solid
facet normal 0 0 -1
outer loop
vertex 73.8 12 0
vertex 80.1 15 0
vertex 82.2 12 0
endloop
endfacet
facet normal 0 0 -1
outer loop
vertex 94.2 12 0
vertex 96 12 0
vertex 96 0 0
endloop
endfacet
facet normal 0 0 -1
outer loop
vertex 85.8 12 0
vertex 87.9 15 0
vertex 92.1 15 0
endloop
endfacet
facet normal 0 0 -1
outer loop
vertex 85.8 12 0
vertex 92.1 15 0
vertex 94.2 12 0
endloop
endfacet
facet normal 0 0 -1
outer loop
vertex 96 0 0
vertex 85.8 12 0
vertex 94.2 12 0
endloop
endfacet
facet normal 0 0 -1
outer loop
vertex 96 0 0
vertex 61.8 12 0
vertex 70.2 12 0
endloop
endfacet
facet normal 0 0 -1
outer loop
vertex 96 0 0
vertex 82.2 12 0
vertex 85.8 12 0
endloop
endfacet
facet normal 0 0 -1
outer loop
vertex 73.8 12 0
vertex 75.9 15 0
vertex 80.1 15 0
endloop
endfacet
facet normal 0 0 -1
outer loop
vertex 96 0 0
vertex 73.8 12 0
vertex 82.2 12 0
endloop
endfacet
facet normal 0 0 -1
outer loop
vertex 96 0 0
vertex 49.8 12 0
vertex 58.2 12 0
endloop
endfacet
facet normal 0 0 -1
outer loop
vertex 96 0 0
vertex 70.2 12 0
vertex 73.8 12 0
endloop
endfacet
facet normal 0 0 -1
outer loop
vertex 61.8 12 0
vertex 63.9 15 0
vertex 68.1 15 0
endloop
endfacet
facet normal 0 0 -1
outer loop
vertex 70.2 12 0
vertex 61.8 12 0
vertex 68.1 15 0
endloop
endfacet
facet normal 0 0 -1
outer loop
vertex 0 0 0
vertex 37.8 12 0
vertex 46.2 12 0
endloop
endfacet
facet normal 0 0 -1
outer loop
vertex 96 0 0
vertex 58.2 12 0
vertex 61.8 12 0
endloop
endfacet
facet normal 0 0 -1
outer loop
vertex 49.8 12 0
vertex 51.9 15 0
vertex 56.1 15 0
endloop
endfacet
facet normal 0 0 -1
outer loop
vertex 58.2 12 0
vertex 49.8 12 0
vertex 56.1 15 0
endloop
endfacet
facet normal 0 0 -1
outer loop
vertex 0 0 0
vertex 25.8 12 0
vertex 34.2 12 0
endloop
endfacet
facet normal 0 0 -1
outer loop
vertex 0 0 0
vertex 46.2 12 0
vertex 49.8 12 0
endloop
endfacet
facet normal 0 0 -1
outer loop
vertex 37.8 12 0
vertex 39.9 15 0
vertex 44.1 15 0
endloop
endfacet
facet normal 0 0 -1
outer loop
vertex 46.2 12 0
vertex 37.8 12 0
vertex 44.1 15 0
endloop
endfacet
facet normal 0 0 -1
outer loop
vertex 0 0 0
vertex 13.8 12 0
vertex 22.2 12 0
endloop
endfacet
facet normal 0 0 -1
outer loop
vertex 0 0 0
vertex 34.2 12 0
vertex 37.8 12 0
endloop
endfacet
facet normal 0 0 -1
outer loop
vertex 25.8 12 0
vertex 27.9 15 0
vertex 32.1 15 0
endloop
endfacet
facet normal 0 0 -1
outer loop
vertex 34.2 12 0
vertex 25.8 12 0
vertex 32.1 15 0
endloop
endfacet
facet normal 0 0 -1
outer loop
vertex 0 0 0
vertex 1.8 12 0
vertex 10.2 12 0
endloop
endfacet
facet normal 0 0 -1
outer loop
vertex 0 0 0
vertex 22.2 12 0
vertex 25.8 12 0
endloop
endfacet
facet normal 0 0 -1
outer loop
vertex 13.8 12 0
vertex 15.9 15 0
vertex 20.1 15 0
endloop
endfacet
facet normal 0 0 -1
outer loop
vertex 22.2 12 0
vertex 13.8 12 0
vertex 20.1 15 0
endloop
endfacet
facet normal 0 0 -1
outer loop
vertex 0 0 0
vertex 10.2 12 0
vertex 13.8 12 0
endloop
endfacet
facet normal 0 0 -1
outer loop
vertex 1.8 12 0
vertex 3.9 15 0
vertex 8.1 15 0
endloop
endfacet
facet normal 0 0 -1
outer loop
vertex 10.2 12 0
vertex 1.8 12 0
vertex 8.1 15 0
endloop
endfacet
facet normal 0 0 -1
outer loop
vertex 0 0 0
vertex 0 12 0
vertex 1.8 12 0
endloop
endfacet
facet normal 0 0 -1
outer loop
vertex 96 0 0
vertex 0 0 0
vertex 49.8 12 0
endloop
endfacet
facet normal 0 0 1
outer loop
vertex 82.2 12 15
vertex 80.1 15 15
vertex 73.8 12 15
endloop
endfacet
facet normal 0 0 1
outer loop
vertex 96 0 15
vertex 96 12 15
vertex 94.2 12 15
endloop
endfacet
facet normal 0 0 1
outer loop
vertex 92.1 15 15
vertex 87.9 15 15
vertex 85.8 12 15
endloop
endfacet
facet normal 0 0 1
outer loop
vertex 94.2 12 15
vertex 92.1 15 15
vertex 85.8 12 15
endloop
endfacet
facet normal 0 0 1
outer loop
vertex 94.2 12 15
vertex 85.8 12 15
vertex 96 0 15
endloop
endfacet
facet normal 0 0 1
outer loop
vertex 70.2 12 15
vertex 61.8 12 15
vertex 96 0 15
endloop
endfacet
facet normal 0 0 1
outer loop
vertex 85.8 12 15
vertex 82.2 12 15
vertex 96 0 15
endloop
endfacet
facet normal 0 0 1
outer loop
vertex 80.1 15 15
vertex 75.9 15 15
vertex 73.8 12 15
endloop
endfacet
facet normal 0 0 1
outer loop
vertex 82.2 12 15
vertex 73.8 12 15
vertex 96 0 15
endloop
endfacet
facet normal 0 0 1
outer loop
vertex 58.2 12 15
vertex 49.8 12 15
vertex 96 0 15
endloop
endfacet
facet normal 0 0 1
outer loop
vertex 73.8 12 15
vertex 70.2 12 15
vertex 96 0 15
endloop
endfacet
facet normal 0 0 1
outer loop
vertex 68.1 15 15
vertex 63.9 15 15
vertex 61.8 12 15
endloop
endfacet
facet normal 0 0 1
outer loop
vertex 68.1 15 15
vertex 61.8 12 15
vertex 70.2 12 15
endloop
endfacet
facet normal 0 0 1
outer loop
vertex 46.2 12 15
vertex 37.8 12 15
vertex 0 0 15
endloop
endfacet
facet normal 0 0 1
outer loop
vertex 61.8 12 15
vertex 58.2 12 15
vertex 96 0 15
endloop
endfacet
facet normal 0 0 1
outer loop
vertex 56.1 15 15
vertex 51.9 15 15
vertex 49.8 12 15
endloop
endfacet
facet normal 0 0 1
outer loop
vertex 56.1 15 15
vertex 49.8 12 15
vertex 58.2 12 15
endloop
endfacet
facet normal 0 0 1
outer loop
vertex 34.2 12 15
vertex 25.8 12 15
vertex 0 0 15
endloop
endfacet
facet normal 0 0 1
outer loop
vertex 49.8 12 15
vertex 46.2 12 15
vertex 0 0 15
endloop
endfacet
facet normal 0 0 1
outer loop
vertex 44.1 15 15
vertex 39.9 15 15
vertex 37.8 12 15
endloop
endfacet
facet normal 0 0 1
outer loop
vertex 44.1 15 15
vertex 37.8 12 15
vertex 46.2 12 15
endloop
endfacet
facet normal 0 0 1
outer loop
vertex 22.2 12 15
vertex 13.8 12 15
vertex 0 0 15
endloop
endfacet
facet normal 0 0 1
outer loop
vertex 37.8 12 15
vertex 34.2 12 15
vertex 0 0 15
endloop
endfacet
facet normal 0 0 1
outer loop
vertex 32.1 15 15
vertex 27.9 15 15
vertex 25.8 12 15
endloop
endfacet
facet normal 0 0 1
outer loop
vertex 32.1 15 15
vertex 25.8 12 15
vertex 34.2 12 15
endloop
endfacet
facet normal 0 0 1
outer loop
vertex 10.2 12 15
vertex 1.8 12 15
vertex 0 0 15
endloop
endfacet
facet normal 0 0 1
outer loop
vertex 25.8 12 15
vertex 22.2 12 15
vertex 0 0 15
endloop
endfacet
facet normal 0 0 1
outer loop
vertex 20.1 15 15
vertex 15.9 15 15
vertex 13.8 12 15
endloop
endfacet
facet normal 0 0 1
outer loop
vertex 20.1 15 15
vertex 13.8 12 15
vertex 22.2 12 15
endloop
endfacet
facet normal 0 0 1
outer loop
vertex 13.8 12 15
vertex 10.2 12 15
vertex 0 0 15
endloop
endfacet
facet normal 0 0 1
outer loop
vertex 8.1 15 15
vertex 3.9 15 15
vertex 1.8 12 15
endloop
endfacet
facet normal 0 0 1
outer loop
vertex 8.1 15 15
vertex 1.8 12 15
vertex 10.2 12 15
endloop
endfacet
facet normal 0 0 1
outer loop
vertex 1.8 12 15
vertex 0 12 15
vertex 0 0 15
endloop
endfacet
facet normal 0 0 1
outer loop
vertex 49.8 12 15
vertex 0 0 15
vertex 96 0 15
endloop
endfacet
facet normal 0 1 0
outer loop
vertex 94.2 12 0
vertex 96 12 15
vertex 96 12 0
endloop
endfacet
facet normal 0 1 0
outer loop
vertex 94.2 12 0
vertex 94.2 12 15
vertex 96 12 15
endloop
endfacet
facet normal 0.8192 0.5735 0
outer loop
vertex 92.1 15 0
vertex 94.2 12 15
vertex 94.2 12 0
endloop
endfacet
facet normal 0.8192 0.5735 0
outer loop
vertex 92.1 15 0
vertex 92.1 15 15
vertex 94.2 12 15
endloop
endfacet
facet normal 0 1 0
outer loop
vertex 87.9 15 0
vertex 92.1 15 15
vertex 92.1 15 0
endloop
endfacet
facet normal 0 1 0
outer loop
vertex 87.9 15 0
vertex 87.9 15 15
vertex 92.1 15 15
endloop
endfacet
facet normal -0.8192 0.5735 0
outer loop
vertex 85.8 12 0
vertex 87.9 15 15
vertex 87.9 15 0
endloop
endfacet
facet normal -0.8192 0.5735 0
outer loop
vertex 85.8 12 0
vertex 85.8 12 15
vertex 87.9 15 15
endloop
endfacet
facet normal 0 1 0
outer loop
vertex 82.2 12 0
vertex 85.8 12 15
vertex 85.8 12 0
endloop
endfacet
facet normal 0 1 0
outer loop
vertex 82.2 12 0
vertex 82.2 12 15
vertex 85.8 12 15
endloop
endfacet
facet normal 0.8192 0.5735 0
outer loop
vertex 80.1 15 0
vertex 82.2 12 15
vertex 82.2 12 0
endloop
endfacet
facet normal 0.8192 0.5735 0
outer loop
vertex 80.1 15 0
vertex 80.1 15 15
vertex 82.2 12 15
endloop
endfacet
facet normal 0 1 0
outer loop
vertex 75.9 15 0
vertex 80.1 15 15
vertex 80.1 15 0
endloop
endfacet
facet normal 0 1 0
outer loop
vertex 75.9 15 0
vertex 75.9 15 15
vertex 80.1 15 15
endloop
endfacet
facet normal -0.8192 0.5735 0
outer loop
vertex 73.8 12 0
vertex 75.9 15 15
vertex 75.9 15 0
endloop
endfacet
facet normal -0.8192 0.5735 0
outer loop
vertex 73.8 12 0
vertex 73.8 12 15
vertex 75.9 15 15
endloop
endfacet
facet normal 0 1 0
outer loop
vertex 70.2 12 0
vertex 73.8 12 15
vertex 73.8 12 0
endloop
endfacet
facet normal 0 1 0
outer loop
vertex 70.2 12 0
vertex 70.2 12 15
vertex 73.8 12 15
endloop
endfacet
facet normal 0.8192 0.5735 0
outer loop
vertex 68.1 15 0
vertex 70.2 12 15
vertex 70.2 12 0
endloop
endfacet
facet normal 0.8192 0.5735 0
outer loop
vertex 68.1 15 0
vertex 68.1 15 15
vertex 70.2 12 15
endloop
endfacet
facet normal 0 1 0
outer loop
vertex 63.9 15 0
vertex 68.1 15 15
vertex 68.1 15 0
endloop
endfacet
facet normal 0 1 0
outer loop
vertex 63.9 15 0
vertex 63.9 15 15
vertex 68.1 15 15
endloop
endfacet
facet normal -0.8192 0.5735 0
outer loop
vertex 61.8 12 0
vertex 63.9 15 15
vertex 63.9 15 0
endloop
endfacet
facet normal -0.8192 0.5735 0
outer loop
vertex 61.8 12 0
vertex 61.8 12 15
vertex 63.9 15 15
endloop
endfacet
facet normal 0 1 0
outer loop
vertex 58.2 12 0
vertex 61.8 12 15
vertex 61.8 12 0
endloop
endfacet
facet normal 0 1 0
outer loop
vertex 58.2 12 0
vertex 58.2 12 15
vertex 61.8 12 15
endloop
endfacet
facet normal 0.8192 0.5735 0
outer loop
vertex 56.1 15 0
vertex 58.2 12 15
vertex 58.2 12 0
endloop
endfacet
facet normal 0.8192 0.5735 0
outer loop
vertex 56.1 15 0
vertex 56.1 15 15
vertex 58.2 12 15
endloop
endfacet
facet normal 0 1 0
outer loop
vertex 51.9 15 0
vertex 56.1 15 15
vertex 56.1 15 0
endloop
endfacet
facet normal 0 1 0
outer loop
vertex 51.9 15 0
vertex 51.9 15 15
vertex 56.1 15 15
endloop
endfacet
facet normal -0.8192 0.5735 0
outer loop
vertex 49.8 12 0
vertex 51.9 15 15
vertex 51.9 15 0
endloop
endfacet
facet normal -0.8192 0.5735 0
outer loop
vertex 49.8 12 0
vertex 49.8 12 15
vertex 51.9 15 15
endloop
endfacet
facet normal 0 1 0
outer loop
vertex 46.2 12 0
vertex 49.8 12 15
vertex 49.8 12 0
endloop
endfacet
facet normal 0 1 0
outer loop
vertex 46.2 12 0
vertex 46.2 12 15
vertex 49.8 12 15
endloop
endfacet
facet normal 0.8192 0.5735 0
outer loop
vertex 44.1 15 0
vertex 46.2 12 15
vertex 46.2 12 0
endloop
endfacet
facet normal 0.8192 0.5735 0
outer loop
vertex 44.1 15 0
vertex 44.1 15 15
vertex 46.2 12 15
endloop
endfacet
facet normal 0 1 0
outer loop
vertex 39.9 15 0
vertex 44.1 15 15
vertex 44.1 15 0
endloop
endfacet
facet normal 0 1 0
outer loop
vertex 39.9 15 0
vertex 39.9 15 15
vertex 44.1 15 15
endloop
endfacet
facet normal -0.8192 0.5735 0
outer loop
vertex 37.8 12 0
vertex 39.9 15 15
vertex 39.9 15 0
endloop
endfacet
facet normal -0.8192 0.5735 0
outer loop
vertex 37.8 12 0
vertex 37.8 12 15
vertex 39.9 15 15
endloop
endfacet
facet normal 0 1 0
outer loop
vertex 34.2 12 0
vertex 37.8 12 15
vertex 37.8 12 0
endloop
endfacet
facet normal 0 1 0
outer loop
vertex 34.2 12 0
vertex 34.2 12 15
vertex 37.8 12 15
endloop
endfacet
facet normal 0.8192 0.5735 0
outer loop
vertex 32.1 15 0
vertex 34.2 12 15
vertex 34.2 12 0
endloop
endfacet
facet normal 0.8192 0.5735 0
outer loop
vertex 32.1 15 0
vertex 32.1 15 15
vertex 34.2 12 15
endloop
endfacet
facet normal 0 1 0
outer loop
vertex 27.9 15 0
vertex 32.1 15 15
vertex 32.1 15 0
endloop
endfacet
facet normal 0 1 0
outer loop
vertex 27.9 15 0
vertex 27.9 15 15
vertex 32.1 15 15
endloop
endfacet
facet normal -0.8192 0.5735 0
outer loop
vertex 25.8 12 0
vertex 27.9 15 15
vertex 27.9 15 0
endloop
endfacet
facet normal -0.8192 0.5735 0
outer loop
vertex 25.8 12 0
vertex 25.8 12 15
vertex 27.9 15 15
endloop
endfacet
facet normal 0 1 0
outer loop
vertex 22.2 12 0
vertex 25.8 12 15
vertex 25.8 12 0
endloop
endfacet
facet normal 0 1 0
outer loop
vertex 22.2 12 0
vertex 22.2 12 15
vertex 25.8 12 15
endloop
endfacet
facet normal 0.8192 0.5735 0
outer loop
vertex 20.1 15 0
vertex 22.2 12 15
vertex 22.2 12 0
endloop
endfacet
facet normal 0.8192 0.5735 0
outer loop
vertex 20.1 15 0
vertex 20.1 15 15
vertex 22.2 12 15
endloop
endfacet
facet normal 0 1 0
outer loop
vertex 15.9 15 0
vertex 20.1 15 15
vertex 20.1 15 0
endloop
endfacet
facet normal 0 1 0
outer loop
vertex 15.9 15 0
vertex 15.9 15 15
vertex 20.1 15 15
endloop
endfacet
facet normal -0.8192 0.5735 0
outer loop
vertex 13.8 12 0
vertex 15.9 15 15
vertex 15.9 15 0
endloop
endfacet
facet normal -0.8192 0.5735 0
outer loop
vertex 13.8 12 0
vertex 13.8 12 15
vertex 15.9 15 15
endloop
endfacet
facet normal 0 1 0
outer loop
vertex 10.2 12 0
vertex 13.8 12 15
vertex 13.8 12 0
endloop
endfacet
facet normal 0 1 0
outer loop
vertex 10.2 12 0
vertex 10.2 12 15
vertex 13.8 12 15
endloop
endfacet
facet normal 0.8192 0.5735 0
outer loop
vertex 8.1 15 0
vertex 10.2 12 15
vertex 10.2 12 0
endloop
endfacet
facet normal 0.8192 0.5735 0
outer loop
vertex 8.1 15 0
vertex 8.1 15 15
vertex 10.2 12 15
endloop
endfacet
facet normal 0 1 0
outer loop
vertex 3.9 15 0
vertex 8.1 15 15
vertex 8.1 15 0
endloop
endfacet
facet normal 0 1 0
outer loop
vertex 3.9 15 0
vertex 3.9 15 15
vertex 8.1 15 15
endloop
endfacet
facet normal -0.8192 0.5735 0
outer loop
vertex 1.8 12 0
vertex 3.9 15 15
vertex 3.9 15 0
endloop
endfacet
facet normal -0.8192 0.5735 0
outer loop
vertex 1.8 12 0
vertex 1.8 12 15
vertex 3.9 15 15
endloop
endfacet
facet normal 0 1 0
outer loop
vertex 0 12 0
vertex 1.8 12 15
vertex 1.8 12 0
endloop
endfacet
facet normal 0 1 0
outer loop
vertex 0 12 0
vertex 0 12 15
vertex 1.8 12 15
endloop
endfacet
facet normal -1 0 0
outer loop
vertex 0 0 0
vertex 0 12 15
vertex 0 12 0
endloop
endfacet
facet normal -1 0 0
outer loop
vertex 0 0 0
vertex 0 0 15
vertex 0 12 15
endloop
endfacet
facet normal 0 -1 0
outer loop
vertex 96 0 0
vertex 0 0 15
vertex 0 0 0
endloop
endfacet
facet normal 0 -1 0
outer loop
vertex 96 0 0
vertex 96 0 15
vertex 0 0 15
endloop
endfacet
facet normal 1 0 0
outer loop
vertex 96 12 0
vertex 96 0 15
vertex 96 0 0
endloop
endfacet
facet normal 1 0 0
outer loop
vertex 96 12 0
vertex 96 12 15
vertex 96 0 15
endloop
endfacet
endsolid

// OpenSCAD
$fn = 32;

// ----------------------------------------------------------------------
// Gear rack: 8 teeth, pitch 12 mm
// ----------------------------------------------------------------------

// --- parameters (mm) ---
teeth = 8;                // number of teeth
pitch = 12;               // tooth pitch, X
root_w = 8.4;             // tooth width at the root
tip_w = 4.2;              // tooth width at the tip
base_h = 12;              // rack body height, Y
tooth_h = 3;              // tooth height above the body
plate_t = 15;             // rack width, Z (extrusion height)

rack_l = teeth * pitch;  // overall length
total_h = base_h + tooth_h;  // overall height

profile = [[0, 0], [96, 0], [96, 12], [94.2, 12], [92.1, 15], [87.9, 15], [85.8, 12], [82.2, 12], [80.1, 15], [75.9, 15], [73.8, 12], [70.2, 12], [68.1, 15], [63.9, 15], [61.8, 12], [58.2, 12], [56.1, 15], [51.9, 15], [49.8, 12], [46.2, 12], [44.1, 15], [39.9, 15], [37.8, 12], [34.2, 12], [32.1, 15], [27.9, 15], [25.8, 12], [22.2, 12], [20.1, 15], [15.9, 15], [13.8, 12], [10.2, 12], [8.1, 15], [3.9, 15], [1.8, 12], [0, 12]];  // primary outline, 36 points, counter clockwise

// --- the one profile operation ---
linear_extrude(height = plate_t) polygon(points = profile);
